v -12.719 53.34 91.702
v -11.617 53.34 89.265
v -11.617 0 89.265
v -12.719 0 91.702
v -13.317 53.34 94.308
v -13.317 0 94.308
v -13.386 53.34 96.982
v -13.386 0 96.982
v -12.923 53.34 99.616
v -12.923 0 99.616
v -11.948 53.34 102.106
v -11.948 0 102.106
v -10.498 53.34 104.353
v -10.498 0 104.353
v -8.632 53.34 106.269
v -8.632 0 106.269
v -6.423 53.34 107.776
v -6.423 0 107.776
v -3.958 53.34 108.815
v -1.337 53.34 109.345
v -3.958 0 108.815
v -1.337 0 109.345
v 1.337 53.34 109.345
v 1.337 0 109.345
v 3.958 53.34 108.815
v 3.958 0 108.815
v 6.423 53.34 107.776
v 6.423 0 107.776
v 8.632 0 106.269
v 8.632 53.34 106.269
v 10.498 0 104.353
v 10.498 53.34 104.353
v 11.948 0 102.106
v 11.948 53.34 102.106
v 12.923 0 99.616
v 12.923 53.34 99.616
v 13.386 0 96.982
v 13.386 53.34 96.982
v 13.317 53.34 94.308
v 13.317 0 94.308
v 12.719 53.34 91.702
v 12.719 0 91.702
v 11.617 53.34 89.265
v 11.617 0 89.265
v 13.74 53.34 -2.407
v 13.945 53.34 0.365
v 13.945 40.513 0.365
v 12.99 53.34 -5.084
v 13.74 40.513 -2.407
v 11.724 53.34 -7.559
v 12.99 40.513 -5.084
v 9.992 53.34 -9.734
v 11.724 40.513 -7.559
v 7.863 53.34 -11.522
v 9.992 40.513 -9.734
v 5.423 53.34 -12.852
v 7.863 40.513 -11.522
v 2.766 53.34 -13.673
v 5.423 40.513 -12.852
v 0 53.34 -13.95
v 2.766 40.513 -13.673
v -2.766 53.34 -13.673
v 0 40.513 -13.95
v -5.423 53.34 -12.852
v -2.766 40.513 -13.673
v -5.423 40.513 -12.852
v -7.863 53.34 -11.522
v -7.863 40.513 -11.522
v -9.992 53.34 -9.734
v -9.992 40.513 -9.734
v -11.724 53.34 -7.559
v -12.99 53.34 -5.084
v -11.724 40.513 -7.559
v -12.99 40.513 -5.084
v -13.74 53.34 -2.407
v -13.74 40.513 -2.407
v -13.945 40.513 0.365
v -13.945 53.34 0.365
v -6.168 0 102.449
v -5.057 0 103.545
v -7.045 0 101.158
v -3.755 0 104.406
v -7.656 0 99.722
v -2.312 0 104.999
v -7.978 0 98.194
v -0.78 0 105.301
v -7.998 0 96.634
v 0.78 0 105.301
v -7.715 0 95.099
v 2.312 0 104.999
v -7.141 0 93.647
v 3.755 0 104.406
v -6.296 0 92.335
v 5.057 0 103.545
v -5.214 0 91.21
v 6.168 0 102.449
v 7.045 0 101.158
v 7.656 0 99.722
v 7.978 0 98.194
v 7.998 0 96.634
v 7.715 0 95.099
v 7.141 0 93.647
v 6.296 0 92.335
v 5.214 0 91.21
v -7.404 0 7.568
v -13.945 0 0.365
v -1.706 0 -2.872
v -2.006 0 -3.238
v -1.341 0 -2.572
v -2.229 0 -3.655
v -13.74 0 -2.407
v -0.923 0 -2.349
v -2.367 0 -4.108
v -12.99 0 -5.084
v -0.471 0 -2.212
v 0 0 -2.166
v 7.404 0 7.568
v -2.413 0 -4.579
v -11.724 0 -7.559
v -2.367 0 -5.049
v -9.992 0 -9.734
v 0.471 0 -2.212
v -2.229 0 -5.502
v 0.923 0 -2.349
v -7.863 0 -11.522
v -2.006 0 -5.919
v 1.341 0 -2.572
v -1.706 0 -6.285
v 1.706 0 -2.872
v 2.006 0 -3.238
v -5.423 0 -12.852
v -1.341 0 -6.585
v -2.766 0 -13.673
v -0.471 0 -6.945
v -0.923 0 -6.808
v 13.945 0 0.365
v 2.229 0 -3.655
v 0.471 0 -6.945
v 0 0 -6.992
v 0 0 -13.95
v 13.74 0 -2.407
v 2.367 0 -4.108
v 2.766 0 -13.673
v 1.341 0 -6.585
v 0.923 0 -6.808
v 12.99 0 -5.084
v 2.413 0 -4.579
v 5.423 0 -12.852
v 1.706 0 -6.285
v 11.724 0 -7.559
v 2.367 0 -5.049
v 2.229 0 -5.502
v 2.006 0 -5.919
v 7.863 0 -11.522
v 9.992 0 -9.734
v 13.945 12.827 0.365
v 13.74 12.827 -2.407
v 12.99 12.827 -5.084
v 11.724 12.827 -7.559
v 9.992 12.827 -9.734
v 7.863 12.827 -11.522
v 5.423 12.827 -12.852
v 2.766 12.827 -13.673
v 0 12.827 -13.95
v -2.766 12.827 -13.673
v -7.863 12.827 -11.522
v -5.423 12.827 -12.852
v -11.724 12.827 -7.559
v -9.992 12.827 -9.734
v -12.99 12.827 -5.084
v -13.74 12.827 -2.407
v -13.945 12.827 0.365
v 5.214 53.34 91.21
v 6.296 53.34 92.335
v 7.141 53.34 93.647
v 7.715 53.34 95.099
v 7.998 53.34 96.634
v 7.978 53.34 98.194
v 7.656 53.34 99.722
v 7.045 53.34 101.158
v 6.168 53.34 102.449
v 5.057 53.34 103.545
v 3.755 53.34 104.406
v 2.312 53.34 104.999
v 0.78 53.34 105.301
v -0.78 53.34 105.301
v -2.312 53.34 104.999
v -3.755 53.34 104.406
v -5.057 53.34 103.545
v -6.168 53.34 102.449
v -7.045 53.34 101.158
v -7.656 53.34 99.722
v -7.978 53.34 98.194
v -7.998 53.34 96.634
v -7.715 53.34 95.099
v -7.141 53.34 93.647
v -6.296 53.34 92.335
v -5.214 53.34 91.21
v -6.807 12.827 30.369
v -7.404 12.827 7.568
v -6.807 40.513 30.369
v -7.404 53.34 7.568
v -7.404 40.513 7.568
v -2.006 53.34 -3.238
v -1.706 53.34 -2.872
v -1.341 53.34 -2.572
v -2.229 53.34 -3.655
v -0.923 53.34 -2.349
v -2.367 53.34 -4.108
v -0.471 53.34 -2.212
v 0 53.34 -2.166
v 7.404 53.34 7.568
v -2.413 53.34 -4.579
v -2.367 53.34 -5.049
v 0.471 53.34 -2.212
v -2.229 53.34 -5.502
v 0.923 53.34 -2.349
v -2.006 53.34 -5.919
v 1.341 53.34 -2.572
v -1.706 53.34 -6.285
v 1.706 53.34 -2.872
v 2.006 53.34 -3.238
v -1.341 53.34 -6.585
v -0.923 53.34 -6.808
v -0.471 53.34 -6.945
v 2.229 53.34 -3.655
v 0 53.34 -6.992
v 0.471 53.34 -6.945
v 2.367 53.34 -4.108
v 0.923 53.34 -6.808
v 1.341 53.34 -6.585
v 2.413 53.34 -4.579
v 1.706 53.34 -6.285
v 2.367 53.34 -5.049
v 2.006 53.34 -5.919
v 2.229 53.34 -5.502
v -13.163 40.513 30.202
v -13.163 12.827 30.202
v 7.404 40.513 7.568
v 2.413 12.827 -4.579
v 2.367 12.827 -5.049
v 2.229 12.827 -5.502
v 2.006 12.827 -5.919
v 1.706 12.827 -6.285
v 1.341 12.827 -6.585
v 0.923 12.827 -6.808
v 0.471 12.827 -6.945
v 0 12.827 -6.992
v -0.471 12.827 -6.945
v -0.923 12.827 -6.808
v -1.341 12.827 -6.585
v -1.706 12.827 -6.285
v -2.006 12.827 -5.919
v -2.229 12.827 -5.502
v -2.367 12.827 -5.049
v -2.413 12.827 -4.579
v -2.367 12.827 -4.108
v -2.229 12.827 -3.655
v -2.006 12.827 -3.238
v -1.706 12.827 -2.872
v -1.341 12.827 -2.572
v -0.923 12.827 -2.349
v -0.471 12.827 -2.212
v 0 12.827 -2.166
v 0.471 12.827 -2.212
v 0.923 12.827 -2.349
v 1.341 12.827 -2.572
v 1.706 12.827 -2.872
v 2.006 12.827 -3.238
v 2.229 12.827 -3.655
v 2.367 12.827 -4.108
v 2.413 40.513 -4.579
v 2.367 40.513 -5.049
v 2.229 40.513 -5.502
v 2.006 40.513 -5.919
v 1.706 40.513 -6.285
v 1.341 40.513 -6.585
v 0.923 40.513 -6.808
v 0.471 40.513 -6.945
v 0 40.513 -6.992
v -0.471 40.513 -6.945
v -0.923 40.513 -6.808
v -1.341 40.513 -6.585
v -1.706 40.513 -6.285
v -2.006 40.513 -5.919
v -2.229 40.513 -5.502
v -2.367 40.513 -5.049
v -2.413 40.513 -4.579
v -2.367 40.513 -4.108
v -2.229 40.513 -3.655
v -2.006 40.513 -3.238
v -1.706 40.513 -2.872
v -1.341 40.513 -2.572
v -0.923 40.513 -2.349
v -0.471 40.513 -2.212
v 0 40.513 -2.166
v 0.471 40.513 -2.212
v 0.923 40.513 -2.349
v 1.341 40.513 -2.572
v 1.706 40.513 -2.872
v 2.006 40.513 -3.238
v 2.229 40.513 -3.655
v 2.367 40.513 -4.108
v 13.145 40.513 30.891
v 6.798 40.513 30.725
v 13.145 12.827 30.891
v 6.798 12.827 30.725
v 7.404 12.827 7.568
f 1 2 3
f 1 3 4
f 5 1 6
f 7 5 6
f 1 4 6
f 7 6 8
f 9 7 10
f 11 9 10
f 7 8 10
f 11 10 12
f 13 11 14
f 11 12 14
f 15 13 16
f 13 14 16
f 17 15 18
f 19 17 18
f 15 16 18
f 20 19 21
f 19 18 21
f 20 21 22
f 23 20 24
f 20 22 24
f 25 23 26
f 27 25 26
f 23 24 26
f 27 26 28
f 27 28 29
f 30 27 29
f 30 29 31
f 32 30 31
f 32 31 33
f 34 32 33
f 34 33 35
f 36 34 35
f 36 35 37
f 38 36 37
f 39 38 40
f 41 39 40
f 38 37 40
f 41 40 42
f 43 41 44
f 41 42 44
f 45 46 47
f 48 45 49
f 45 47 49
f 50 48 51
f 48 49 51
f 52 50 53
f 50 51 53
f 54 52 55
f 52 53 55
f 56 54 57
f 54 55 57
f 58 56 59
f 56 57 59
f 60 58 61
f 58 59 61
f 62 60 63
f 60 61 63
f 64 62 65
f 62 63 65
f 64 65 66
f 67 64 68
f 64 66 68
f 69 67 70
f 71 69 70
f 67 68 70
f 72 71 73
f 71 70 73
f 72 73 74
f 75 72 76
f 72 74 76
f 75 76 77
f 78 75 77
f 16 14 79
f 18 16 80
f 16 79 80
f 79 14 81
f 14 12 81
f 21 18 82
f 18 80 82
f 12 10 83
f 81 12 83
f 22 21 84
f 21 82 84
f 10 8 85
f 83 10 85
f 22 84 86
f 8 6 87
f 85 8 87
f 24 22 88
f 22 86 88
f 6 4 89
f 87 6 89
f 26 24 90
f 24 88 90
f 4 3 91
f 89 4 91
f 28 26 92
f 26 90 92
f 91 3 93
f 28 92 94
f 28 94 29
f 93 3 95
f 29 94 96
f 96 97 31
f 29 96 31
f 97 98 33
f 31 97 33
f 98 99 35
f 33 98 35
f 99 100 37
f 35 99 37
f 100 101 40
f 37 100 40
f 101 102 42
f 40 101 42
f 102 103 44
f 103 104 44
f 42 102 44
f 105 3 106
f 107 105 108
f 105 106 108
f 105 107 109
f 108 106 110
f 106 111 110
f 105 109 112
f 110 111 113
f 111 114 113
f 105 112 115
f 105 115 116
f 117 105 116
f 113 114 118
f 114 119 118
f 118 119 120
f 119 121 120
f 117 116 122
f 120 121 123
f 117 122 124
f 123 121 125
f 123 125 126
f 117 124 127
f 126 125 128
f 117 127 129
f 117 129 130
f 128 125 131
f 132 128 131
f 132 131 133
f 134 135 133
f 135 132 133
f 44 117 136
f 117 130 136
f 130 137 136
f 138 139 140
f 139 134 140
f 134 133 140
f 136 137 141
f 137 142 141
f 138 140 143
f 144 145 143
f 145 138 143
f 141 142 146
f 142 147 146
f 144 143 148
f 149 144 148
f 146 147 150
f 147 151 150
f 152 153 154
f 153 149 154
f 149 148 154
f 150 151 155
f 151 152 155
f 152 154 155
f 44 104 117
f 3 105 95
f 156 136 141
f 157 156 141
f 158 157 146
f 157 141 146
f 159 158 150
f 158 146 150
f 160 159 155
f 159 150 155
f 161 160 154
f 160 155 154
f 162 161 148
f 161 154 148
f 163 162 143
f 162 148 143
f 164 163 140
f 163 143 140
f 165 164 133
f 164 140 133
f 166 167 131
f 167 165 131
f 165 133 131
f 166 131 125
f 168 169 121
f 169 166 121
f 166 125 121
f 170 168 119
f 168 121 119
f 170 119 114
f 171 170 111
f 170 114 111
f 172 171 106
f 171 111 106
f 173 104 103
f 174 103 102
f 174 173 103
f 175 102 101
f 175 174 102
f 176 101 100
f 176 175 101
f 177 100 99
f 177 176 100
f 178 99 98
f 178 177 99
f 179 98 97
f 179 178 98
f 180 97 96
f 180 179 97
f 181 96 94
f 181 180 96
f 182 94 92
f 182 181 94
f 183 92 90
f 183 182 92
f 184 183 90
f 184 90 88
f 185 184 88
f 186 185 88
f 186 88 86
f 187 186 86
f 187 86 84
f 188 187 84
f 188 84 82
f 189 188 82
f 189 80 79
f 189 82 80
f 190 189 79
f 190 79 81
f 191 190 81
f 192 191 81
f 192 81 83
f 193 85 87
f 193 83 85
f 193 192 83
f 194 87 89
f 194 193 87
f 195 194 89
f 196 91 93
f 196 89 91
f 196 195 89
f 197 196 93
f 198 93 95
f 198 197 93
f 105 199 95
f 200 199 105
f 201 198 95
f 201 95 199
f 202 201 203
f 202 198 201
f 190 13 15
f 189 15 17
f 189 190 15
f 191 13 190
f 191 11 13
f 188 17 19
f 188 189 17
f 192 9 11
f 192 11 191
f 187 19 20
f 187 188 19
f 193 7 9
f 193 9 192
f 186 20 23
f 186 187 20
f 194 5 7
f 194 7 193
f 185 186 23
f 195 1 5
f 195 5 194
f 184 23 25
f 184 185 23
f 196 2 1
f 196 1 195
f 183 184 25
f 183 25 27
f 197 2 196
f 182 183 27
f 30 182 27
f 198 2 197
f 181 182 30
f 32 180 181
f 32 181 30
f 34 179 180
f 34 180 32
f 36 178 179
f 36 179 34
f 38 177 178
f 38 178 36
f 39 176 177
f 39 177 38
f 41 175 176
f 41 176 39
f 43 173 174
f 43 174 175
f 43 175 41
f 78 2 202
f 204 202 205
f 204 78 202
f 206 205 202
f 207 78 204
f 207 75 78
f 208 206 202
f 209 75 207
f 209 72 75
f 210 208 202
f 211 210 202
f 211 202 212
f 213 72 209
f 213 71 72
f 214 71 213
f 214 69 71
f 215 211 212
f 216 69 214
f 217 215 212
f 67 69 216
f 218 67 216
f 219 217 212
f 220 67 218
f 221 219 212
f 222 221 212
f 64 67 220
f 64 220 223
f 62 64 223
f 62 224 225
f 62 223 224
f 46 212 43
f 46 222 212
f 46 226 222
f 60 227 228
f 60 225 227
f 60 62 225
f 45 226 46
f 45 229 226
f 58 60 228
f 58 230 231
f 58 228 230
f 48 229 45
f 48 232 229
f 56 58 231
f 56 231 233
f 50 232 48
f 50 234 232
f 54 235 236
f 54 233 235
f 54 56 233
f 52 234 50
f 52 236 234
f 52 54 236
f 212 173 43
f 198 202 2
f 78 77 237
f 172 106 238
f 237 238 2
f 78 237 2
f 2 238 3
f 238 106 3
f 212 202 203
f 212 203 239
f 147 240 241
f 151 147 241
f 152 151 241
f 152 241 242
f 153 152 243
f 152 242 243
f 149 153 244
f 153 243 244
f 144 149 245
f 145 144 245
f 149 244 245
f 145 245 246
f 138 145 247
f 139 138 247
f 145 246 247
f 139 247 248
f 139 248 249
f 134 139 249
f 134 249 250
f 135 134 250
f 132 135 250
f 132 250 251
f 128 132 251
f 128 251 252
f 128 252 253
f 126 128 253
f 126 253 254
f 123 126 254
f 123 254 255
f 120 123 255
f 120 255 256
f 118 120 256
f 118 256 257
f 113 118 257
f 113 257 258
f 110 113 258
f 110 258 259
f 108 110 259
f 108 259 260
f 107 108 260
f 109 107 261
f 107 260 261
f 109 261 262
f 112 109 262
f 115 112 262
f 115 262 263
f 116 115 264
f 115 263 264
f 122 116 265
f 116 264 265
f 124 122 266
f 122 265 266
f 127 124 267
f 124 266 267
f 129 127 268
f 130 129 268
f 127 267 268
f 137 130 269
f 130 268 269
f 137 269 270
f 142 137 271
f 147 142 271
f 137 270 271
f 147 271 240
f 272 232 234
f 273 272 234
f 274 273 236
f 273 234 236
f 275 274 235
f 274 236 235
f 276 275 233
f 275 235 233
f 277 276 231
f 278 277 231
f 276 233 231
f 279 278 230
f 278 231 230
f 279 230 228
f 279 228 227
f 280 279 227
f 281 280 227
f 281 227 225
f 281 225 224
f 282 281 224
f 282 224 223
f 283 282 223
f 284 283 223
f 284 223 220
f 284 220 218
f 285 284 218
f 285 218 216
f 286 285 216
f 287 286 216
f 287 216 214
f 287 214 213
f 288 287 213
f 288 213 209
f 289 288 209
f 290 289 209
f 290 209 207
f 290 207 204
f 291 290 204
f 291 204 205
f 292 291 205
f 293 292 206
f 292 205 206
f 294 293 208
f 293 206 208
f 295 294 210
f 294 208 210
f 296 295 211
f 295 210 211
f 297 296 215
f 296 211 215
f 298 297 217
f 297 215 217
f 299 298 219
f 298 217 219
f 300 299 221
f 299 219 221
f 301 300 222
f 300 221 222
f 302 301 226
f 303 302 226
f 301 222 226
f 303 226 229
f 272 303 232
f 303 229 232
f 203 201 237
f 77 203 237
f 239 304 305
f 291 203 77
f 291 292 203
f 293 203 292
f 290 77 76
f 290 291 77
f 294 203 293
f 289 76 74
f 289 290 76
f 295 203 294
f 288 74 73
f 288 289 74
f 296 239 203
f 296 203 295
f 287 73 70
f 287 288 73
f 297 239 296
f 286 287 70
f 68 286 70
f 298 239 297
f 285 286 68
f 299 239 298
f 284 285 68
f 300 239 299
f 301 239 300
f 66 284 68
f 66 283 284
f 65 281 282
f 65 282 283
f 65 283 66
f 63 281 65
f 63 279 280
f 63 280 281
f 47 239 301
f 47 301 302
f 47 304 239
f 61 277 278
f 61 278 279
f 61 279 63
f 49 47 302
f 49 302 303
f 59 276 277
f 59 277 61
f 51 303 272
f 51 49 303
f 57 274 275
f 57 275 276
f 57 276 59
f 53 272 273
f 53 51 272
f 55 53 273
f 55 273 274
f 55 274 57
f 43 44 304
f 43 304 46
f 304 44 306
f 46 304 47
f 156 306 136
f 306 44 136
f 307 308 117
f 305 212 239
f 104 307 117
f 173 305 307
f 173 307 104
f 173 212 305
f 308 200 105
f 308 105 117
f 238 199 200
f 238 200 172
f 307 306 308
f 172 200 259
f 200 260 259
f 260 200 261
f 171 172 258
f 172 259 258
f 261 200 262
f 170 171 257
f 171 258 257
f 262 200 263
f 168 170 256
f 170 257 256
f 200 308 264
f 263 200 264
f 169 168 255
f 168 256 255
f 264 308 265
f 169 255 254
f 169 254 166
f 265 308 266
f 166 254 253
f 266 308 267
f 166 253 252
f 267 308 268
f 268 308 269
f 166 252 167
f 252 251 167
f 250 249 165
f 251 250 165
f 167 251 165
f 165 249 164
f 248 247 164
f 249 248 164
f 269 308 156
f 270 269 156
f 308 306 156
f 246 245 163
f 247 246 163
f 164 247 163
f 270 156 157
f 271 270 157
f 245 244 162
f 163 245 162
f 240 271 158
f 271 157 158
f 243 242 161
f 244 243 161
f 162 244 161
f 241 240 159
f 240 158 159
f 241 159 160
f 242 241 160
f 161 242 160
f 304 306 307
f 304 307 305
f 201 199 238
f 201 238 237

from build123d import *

# Parameters (mm, degrees)
BOSS_EXTRUDE1_DEPTH = 53.34
SKETCH4_W           = 61.072672184
SKETCH4_H           = 27.686
CUT_EXTRUDE3_DEPTH  = 29.259495037
SKETCH5_OUTSIDE_W   = 57.352
SKETCH5_OUTSIDE_H   = 152.814
CUT_EXTRUDE5_DEPTH  = 54.34
SKETCH6_R           = 2.413
CUT_EXTRUDE6_DEPTH  = 54.34


with BuildPart() as part:
    # Sketch1 → Boss-Extrude1 (new body)
    with BuildSketch(Plane(origin=(0, 0, 0), x_dir=(1, 0, 0), z_dir=(0, 1, 0))):
        with BuildLine():
            Line((-13.944778991, -0.365156889), (-11.616850564, -89.265156889))
            ThreePointArc((-11.616850564, -89.265156889), (0, -109.412099434), (11.616850564, -89.265156889))
            Line((11.616850564, -89.265156889), (13.944778991, -0.365156889))
            ThreePointArc((13.944778991, -0.365156889), (0, 13.949559157), (-13.944778991, -0.365156889))
        make_face()
    extrude(amount=BOSS_EXTRUDE1_DEPTH)

    # Sketch4 → Cut-Extrude3 (cut, through all)
    with BuildSketch(Plane(origin=(13.944778991, 0, 0.365156889), x_dir=(0.026176948, 0, -0.999657325), z_dir=(0.999657325, 0, 0.026176948))):
        with Locations((0, 26.67)):
            Rectangle(SKETCH4_W, SKETCH4_H)
    extrude(amount=-CUT_EXTRUDE3_DEPTH, mode=Mode.SUBTRACT)

    # Sketch5 outside → Cut-Extrude5 (cut, through all)
    with BuildSketch(Plane(origin=(0, 53.34, 0), x_dir=(1, 0, 0), z_dir=(0, 1, 0))):
        with Locations((0, -47.731)):
            Rectangle(SKETCH5_OUTSIDE_W, SKETCH5_OUTSIDE_H)
        with BuildLine():
            Line((-13.944778991, -0.365156889), (-11.616850564, -89.265156889))
            ThreePointArc((-11.616850564, -89.265156889), (0, -109.412099434), (11.616850564, -89.265156889))
            Line((11.616850564, -89.265156889), (13.944778991, -0.365156889))
            ThreePointArc((13.944778991, -0.365156889), (0, 13.949559157), (-13.944778991, -0.365156889))
        make_face(mode=Mode.SUBTRACT)
        with BuildLine():
            Line((7.403977553, -7.568443783), (5.213735587, -91.210409969))
            ThreePointArc((5.213735587, -91.210409969), (0, -105.33899845), (-5.213735587, -91.210409969))
            Line((-5.213735587, -91.210409969), (-7.403977553, -7.568443783))
            Line((-7.403977553, -7.568443783), (7.403977553, -7.568443783))
        make_face()
    extrude(amount=-CUT_EXTRUDE5_DEPTH, mode=Mode.SUBTRACT)

    # Sketch6 → Cut-Extrude6 (cut, through all)
    with BuildSketch(Plane(origin=(0, 53.34, 0), x_dir=(1, 0, 0), z_dir=(0, 1, 0))):
        with Locations((0, 4.57874024)):
            Circle(SKETCH6_R)
    extrude(amount=-CUT_EXTRUDE6_DEPTH, mode=Mode.SUBTRACT)


solid = part.part
